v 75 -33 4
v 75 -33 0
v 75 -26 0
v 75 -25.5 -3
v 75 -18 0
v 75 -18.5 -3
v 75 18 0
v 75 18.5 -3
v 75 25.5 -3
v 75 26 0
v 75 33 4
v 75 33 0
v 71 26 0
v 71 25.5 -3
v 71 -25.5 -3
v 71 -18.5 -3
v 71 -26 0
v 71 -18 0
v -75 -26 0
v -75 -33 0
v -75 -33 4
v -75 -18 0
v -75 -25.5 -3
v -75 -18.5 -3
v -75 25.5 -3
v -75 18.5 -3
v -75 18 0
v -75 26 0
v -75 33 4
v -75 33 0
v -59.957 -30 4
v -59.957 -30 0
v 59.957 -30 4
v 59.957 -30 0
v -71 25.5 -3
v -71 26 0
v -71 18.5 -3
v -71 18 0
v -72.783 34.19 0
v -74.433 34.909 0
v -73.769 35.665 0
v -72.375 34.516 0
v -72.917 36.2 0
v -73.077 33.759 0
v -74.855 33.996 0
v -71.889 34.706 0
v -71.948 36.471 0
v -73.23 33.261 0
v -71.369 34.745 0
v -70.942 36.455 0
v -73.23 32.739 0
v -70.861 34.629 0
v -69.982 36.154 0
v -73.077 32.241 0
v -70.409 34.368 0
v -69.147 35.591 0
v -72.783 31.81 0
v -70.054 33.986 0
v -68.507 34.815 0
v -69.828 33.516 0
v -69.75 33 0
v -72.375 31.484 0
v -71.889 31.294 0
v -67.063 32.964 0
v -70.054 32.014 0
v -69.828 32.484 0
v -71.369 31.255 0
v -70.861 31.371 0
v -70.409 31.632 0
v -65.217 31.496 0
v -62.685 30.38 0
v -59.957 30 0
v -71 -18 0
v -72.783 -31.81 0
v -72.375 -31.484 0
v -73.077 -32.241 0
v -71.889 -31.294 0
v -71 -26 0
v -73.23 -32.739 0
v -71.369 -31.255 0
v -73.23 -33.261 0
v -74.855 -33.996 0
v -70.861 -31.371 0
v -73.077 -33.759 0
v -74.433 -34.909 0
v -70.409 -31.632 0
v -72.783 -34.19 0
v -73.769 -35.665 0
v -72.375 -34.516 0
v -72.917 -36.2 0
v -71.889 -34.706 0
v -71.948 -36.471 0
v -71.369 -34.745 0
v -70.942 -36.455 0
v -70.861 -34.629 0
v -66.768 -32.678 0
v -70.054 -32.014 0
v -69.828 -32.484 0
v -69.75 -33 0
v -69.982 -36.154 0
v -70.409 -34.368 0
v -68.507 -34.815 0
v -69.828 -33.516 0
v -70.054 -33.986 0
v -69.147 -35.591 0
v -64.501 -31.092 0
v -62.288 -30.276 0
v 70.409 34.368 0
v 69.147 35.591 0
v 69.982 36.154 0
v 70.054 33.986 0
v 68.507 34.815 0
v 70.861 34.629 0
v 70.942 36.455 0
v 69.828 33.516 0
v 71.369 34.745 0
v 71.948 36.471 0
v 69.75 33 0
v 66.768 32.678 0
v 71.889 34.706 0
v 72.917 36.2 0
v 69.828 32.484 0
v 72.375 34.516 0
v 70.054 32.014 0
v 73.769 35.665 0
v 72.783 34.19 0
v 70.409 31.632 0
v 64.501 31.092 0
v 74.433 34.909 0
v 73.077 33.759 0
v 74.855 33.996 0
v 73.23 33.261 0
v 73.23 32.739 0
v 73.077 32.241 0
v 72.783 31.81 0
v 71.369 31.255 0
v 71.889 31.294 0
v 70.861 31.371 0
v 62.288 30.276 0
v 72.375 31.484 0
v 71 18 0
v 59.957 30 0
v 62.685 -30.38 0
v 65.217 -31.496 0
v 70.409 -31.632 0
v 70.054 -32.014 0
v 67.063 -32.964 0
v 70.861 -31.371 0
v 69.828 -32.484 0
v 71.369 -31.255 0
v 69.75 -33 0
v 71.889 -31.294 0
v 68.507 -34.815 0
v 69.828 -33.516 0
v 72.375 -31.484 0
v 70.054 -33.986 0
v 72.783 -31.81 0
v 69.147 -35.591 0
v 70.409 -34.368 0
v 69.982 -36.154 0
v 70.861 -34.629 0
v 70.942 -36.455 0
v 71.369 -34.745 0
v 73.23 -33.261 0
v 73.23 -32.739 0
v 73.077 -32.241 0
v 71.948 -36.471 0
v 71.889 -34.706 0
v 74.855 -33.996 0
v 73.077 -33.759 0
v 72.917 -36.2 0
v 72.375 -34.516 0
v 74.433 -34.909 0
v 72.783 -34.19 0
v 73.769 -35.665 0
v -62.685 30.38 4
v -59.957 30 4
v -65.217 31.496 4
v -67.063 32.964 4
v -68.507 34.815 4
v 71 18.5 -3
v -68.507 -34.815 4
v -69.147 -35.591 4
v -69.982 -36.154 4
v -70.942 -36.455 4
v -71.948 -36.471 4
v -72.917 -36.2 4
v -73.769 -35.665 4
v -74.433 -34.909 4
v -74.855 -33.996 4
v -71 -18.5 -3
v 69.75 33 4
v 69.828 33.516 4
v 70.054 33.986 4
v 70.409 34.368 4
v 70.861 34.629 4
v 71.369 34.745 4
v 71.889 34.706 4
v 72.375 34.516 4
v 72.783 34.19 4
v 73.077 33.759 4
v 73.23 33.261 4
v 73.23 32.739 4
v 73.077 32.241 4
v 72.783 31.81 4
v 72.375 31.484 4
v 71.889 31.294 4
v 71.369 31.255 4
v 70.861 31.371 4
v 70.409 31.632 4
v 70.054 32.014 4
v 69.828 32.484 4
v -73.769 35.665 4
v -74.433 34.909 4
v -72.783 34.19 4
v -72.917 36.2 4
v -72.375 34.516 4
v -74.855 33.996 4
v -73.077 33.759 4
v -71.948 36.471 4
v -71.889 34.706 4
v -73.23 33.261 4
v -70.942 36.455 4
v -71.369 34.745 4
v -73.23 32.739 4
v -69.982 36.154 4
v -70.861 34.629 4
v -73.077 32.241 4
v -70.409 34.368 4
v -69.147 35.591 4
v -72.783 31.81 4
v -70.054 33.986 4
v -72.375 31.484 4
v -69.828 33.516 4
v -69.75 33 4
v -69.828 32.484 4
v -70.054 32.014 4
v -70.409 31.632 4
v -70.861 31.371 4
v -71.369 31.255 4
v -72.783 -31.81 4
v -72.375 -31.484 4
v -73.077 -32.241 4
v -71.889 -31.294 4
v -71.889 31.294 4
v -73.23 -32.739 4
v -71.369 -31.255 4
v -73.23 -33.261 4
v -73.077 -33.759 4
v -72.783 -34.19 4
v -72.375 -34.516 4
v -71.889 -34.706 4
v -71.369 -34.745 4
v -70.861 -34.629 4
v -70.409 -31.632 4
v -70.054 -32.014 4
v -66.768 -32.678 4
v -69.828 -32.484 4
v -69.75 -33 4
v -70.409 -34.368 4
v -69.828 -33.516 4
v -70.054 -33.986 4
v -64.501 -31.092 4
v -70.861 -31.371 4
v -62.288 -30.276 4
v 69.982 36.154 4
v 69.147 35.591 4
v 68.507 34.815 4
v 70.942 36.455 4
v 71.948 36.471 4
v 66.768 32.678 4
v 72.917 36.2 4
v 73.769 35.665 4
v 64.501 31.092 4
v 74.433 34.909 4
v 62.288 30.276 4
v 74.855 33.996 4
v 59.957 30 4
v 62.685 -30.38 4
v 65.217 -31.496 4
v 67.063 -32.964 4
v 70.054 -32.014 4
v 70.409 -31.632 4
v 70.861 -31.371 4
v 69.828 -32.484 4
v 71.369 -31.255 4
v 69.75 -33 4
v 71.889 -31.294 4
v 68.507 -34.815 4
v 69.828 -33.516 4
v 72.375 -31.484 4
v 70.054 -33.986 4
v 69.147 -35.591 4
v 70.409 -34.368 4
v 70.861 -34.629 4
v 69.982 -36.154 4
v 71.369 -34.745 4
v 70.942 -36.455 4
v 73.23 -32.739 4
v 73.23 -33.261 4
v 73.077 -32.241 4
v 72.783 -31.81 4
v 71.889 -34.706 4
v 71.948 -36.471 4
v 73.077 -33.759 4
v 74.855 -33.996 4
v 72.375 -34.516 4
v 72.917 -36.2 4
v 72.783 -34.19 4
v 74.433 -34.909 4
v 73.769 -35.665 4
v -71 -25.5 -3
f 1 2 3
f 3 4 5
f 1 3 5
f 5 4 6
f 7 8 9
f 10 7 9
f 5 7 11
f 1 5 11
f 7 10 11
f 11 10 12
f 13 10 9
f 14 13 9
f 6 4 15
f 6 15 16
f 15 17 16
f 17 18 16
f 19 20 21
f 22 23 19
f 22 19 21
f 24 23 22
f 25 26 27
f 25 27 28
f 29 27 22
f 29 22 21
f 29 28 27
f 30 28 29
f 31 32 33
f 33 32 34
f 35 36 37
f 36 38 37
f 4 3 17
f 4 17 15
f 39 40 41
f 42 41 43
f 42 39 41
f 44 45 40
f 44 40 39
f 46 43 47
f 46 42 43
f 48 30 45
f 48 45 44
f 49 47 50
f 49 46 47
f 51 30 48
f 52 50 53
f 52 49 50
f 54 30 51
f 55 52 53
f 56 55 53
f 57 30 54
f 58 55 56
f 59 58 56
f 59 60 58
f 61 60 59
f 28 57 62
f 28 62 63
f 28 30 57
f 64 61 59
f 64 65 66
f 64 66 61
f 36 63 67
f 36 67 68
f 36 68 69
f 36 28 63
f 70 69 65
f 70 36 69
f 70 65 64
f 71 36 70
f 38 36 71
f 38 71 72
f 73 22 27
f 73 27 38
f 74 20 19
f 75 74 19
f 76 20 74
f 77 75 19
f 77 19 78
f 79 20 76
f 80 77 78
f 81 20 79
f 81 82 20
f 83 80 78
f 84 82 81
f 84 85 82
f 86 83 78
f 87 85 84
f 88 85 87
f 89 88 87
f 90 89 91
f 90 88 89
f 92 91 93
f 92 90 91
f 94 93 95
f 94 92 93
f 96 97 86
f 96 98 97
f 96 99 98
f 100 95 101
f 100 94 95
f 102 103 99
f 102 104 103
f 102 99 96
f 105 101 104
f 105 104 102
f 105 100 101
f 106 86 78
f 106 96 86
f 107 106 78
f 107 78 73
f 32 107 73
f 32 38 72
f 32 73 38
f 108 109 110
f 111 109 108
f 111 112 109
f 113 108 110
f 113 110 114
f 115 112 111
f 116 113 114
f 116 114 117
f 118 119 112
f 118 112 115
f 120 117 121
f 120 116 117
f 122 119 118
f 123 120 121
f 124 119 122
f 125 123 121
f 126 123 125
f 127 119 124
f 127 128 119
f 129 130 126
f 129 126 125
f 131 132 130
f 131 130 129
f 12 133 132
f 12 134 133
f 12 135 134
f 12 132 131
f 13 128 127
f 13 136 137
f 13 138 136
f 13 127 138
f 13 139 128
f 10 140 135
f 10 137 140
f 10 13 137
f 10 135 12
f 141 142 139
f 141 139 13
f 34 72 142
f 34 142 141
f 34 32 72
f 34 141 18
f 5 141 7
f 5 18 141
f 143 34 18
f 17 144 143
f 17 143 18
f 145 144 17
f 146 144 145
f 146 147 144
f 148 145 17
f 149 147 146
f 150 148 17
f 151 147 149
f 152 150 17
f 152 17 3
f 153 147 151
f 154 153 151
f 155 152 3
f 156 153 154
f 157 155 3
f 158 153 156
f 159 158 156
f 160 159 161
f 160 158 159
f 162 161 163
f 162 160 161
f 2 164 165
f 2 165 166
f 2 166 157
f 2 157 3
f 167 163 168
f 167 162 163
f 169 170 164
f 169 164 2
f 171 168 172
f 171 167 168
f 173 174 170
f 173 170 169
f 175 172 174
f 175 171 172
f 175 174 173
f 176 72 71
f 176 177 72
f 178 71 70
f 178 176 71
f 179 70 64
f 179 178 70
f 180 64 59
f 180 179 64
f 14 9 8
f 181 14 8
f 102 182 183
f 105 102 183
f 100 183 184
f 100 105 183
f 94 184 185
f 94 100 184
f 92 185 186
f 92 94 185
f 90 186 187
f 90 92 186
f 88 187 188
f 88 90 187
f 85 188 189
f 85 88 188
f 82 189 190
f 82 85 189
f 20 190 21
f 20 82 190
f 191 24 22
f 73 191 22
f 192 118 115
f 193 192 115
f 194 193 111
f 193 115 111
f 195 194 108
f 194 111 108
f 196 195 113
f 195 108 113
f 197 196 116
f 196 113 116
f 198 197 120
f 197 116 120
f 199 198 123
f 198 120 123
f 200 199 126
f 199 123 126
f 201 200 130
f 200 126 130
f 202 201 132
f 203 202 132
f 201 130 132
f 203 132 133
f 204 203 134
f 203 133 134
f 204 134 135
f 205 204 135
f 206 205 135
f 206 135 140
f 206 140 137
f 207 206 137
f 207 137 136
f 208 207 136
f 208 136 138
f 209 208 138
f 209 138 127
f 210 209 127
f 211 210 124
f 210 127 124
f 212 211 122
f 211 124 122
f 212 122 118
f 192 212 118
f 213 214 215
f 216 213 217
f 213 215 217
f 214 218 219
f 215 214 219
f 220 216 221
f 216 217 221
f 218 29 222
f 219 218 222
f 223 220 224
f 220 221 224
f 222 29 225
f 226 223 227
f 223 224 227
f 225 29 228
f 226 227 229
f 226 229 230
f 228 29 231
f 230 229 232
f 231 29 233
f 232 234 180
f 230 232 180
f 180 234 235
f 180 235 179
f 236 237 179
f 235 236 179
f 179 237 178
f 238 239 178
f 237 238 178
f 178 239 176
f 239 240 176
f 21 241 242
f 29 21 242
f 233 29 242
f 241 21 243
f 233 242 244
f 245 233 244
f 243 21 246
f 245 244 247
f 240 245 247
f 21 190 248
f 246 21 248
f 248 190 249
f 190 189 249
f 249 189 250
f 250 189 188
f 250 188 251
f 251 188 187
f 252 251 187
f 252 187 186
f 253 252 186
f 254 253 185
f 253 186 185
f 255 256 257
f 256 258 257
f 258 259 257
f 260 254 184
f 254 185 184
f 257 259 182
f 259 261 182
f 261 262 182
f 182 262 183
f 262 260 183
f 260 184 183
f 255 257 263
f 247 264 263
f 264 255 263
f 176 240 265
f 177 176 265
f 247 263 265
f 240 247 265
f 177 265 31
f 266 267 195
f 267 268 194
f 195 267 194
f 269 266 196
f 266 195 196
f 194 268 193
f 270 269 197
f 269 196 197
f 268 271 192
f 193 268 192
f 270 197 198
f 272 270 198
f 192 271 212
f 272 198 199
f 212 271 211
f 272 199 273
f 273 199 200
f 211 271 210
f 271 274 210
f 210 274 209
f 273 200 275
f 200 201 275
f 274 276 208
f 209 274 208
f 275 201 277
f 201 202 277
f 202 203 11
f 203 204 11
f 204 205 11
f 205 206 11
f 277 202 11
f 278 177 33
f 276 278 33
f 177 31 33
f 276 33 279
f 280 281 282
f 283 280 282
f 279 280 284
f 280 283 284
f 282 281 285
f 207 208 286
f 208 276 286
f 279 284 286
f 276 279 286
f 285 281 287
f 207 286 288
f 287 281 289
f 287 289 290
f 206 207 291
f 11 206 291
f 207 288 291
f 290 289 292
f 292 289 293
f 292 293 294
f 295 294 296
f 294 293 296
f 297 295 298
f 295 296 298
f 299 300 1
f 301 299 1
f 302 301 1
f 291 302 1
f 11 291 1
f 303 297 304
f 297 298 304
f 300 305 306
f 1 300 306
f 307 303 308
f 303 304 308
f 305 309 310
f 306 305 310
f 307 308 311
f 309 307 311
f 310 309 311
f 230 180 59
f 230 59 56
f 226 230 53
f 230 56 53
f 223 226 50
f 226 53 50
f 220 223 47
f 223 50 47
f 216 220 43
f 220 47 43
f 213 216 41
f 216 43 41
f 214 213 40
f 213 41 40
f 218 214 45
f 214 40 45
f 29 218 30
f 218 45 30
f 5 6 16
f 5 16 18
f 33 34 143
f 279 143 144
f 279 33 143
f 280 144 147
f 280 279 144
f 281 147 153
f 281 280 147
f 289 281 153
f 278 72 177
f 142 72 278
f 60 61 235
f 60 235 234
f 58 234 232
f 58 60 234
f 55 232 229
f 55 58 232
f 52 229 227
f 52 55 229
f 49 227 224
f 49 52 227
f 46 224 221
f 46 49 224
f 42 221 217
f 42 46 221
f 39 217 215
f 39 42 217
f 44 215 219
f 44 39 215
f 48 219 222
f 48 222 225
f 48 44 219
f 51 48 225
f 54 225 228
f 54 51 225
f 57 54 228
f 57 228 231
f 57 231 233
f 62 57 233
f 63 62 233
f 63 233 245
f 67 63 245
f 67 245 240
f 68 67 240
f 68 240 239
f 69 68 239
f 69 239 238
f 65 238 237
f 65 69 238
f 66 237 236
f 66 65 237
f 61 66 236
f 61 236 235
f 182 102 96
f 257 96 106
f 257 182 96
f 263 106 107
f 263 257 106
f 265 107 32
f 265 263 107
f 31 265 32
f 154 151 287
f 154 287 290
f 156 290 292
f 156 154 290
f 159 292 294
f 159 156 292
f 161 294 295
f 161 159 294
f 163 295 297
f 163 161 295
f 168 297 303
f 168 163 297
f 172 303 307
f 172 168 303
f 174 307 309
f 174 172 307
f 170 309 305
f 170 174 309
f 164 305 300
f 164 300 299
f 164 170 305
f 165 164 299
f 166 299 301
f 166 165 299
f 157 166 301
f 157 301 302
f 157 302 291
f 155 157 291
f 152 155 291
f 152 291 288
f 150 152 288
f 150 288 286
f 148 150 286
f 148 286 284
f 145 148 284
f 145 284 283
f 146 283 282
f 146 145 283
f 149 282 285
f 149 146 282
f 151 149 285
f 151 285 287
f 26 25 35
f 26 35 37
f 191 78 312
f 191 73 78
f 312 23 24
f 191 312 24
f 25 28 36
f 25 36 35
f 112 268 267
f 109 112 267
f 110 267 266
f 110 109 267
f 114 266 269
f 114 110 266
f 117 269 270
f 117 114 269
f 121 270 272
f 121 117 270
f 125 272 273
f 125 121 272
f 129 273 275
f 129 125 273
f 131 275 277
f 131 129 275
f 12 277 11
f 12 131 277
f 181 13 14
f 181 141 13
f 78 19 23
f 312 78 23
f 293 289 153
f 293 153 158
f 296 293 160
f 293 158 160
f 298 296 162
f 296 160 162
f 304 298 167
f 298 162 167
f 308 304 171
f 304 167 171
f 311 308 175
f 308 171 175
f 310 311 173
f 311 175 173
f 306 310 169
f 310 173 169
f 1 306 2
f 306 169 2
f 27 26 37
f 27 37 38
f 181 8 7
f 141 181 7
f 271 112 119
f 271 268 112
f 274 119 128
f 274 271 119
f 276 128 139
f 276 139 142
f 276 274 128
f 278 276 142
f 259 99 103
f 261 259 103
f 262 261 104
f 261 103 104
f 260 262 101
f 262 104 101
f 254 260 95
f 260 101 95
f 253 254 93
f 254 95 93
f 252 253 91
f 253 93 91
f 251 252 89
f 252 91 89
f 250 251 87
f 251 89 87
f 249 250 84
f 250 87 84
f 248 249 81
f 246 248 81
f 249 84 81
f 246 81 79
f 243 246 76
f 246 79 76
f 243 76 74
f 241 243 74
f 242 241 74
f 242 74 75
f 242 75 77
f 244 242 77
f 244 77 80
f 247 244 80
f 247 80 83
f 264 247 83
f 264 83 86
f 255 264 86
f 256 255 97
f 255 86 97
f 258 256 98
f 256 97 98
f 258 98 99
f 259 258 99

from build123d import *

# Parameters (mm, degrees)
SCHIZZO1_W                   = 150
SCHIZZO1_H                   = 60
ESTRUSIONE_ESTRUSIONE1_DEPTH = 4
SCHIZZO5_R                   = 1.75
ESTRUSIONE_ESTRUSIONE3_DEPTH = 4
SPECCHIA6_COPY_1_SKETCH_R    = 1.75
SPECCHIA6_COPY_1_DEPTH       = 4
RACCORDO2_R                  = 10
ESTRUSIONE_ESTRUSIONE4_DEPTH = 4
SPECCHIA8_COPY_1_DEPTH       = 4


with BuildPart() as part:
    # Schizzo1 → Estrusione-Estrusione1 (new body)
    with BuildSketch(Plane.XY):
        Rectangle(SCHIZZO1_W, SCHIZZO1_H)
    extrude(amount=ESTRUSIONE_ESTRUSIONE1_DEPTH)

    # Schizzo5 → Estrusione-Estrusione3 (add)
    with BuildSketch(Plane(origin=(0, 0, 0), x_dir=(-1, 0, 0), z_dir=(0, 0, -1))):
        with BuildLine():
            Line((-75, 30), (-68, 30))
            Line((-68, 30), (-68, 33))
            ThreePointArc((-68, 33), (-71.5, 36.5), (-75, 33))
            Line((-75, 33), (-75, 30))
        make_face()
        with Locations((-71.5, 33)):
            Circle(SCHIZZO5_R, mode=Mode.SUBTRACT)
    estrusione_estrusione3 = extrude(amount=-ESTRUSIONE_ESTRUSIONE3_DEPTH)

    # Specchia5: Estrusione-Estrusione3 across plane
    add(estrusione_estrusione3.mirror(Plane(origin=(0, 0, 0), x_dir=(0, 0, 1), z_dir=(1, 0, 0))))

    # Specchia6: Estrusione-Estrusione3 across plane
    add(estrusione_estrusione3.mirror(Plane.ZX))

    # Specchia6 copy 1 sketch → Specchia6 copy 1 (add)
    with BuildSketch(Plane(origin=(0, 0, 0), x_dir=(1, 0, 0), z_dir=(0, 0, -1))):
        with BuildLine():
            Line((-75, 30), (-68, 30))
            Line((-68, 30), (-68, 33))
            ThreePointArc((-68, 33), (-71.5, 36.5), (-75, 33))
            Line((-75, 33), (-75, 30))
        make_face()
        with Locations((-71.5, 33)):
            Circle(SPECCHIA6_COPY_1_SKETCH_R, mode=Mode.SUBTRACT)
    extrude(amount=-SPECCHIA6_COPY_1_DEPTH)

    # Raccordo2
    raccordo2_edges = [part.edges().sort_by_distance(p)[0] for p in [
        (68, -30, 2),
        (-68, -30, 2),
        (68, 30, 2),
        (-68, 30, 2),
    ]]
    fillet(raccordo2_edges, radius=RACCORDO2_R)

    # Schizzo6 → Estrusione-Estrusione4 (add)
    with BuildSketch(Plane(origin=(75, 0, 0), x_dir=(0, 0, -1), z_dir=(1, 0, 0))):
        Polygon((0, -26), (3, -25.5), (3, -18.5), (0, -18), align=None)
    estrusione_estrusione4 = extrude(amount=-ESTRUSIONE_ESTRUSIONE4_DEPTH)

    # Specchia7: Estrusione-Estrusione4 across plane
    add(estrusione_estrusione4.mirror(Plane(origin=(0, 0, 0), x_dir=(0, 0, 1), z_dir=(1, 0, 0))))

    # Specchia8: Estrusione-Estrusione4 across plane
    add(estrusione_estrusione4.mirror(Plane.ZX))

    # Specchia8 copy 1 sketch → Specchia8 copy 1 (add)
    with BuildSketch(Plane(origin=(-75, 0, 0), x_dir=(0, 0, -1), z_dir=(-1, 0, 0))):
        Polygon((0, -26), (3, -25.5), (3, -18.5), (0, -18), align=None)
    extrude(amount=-SPECCHIA8_COPY_1_DEPTH)


solid = part.part
